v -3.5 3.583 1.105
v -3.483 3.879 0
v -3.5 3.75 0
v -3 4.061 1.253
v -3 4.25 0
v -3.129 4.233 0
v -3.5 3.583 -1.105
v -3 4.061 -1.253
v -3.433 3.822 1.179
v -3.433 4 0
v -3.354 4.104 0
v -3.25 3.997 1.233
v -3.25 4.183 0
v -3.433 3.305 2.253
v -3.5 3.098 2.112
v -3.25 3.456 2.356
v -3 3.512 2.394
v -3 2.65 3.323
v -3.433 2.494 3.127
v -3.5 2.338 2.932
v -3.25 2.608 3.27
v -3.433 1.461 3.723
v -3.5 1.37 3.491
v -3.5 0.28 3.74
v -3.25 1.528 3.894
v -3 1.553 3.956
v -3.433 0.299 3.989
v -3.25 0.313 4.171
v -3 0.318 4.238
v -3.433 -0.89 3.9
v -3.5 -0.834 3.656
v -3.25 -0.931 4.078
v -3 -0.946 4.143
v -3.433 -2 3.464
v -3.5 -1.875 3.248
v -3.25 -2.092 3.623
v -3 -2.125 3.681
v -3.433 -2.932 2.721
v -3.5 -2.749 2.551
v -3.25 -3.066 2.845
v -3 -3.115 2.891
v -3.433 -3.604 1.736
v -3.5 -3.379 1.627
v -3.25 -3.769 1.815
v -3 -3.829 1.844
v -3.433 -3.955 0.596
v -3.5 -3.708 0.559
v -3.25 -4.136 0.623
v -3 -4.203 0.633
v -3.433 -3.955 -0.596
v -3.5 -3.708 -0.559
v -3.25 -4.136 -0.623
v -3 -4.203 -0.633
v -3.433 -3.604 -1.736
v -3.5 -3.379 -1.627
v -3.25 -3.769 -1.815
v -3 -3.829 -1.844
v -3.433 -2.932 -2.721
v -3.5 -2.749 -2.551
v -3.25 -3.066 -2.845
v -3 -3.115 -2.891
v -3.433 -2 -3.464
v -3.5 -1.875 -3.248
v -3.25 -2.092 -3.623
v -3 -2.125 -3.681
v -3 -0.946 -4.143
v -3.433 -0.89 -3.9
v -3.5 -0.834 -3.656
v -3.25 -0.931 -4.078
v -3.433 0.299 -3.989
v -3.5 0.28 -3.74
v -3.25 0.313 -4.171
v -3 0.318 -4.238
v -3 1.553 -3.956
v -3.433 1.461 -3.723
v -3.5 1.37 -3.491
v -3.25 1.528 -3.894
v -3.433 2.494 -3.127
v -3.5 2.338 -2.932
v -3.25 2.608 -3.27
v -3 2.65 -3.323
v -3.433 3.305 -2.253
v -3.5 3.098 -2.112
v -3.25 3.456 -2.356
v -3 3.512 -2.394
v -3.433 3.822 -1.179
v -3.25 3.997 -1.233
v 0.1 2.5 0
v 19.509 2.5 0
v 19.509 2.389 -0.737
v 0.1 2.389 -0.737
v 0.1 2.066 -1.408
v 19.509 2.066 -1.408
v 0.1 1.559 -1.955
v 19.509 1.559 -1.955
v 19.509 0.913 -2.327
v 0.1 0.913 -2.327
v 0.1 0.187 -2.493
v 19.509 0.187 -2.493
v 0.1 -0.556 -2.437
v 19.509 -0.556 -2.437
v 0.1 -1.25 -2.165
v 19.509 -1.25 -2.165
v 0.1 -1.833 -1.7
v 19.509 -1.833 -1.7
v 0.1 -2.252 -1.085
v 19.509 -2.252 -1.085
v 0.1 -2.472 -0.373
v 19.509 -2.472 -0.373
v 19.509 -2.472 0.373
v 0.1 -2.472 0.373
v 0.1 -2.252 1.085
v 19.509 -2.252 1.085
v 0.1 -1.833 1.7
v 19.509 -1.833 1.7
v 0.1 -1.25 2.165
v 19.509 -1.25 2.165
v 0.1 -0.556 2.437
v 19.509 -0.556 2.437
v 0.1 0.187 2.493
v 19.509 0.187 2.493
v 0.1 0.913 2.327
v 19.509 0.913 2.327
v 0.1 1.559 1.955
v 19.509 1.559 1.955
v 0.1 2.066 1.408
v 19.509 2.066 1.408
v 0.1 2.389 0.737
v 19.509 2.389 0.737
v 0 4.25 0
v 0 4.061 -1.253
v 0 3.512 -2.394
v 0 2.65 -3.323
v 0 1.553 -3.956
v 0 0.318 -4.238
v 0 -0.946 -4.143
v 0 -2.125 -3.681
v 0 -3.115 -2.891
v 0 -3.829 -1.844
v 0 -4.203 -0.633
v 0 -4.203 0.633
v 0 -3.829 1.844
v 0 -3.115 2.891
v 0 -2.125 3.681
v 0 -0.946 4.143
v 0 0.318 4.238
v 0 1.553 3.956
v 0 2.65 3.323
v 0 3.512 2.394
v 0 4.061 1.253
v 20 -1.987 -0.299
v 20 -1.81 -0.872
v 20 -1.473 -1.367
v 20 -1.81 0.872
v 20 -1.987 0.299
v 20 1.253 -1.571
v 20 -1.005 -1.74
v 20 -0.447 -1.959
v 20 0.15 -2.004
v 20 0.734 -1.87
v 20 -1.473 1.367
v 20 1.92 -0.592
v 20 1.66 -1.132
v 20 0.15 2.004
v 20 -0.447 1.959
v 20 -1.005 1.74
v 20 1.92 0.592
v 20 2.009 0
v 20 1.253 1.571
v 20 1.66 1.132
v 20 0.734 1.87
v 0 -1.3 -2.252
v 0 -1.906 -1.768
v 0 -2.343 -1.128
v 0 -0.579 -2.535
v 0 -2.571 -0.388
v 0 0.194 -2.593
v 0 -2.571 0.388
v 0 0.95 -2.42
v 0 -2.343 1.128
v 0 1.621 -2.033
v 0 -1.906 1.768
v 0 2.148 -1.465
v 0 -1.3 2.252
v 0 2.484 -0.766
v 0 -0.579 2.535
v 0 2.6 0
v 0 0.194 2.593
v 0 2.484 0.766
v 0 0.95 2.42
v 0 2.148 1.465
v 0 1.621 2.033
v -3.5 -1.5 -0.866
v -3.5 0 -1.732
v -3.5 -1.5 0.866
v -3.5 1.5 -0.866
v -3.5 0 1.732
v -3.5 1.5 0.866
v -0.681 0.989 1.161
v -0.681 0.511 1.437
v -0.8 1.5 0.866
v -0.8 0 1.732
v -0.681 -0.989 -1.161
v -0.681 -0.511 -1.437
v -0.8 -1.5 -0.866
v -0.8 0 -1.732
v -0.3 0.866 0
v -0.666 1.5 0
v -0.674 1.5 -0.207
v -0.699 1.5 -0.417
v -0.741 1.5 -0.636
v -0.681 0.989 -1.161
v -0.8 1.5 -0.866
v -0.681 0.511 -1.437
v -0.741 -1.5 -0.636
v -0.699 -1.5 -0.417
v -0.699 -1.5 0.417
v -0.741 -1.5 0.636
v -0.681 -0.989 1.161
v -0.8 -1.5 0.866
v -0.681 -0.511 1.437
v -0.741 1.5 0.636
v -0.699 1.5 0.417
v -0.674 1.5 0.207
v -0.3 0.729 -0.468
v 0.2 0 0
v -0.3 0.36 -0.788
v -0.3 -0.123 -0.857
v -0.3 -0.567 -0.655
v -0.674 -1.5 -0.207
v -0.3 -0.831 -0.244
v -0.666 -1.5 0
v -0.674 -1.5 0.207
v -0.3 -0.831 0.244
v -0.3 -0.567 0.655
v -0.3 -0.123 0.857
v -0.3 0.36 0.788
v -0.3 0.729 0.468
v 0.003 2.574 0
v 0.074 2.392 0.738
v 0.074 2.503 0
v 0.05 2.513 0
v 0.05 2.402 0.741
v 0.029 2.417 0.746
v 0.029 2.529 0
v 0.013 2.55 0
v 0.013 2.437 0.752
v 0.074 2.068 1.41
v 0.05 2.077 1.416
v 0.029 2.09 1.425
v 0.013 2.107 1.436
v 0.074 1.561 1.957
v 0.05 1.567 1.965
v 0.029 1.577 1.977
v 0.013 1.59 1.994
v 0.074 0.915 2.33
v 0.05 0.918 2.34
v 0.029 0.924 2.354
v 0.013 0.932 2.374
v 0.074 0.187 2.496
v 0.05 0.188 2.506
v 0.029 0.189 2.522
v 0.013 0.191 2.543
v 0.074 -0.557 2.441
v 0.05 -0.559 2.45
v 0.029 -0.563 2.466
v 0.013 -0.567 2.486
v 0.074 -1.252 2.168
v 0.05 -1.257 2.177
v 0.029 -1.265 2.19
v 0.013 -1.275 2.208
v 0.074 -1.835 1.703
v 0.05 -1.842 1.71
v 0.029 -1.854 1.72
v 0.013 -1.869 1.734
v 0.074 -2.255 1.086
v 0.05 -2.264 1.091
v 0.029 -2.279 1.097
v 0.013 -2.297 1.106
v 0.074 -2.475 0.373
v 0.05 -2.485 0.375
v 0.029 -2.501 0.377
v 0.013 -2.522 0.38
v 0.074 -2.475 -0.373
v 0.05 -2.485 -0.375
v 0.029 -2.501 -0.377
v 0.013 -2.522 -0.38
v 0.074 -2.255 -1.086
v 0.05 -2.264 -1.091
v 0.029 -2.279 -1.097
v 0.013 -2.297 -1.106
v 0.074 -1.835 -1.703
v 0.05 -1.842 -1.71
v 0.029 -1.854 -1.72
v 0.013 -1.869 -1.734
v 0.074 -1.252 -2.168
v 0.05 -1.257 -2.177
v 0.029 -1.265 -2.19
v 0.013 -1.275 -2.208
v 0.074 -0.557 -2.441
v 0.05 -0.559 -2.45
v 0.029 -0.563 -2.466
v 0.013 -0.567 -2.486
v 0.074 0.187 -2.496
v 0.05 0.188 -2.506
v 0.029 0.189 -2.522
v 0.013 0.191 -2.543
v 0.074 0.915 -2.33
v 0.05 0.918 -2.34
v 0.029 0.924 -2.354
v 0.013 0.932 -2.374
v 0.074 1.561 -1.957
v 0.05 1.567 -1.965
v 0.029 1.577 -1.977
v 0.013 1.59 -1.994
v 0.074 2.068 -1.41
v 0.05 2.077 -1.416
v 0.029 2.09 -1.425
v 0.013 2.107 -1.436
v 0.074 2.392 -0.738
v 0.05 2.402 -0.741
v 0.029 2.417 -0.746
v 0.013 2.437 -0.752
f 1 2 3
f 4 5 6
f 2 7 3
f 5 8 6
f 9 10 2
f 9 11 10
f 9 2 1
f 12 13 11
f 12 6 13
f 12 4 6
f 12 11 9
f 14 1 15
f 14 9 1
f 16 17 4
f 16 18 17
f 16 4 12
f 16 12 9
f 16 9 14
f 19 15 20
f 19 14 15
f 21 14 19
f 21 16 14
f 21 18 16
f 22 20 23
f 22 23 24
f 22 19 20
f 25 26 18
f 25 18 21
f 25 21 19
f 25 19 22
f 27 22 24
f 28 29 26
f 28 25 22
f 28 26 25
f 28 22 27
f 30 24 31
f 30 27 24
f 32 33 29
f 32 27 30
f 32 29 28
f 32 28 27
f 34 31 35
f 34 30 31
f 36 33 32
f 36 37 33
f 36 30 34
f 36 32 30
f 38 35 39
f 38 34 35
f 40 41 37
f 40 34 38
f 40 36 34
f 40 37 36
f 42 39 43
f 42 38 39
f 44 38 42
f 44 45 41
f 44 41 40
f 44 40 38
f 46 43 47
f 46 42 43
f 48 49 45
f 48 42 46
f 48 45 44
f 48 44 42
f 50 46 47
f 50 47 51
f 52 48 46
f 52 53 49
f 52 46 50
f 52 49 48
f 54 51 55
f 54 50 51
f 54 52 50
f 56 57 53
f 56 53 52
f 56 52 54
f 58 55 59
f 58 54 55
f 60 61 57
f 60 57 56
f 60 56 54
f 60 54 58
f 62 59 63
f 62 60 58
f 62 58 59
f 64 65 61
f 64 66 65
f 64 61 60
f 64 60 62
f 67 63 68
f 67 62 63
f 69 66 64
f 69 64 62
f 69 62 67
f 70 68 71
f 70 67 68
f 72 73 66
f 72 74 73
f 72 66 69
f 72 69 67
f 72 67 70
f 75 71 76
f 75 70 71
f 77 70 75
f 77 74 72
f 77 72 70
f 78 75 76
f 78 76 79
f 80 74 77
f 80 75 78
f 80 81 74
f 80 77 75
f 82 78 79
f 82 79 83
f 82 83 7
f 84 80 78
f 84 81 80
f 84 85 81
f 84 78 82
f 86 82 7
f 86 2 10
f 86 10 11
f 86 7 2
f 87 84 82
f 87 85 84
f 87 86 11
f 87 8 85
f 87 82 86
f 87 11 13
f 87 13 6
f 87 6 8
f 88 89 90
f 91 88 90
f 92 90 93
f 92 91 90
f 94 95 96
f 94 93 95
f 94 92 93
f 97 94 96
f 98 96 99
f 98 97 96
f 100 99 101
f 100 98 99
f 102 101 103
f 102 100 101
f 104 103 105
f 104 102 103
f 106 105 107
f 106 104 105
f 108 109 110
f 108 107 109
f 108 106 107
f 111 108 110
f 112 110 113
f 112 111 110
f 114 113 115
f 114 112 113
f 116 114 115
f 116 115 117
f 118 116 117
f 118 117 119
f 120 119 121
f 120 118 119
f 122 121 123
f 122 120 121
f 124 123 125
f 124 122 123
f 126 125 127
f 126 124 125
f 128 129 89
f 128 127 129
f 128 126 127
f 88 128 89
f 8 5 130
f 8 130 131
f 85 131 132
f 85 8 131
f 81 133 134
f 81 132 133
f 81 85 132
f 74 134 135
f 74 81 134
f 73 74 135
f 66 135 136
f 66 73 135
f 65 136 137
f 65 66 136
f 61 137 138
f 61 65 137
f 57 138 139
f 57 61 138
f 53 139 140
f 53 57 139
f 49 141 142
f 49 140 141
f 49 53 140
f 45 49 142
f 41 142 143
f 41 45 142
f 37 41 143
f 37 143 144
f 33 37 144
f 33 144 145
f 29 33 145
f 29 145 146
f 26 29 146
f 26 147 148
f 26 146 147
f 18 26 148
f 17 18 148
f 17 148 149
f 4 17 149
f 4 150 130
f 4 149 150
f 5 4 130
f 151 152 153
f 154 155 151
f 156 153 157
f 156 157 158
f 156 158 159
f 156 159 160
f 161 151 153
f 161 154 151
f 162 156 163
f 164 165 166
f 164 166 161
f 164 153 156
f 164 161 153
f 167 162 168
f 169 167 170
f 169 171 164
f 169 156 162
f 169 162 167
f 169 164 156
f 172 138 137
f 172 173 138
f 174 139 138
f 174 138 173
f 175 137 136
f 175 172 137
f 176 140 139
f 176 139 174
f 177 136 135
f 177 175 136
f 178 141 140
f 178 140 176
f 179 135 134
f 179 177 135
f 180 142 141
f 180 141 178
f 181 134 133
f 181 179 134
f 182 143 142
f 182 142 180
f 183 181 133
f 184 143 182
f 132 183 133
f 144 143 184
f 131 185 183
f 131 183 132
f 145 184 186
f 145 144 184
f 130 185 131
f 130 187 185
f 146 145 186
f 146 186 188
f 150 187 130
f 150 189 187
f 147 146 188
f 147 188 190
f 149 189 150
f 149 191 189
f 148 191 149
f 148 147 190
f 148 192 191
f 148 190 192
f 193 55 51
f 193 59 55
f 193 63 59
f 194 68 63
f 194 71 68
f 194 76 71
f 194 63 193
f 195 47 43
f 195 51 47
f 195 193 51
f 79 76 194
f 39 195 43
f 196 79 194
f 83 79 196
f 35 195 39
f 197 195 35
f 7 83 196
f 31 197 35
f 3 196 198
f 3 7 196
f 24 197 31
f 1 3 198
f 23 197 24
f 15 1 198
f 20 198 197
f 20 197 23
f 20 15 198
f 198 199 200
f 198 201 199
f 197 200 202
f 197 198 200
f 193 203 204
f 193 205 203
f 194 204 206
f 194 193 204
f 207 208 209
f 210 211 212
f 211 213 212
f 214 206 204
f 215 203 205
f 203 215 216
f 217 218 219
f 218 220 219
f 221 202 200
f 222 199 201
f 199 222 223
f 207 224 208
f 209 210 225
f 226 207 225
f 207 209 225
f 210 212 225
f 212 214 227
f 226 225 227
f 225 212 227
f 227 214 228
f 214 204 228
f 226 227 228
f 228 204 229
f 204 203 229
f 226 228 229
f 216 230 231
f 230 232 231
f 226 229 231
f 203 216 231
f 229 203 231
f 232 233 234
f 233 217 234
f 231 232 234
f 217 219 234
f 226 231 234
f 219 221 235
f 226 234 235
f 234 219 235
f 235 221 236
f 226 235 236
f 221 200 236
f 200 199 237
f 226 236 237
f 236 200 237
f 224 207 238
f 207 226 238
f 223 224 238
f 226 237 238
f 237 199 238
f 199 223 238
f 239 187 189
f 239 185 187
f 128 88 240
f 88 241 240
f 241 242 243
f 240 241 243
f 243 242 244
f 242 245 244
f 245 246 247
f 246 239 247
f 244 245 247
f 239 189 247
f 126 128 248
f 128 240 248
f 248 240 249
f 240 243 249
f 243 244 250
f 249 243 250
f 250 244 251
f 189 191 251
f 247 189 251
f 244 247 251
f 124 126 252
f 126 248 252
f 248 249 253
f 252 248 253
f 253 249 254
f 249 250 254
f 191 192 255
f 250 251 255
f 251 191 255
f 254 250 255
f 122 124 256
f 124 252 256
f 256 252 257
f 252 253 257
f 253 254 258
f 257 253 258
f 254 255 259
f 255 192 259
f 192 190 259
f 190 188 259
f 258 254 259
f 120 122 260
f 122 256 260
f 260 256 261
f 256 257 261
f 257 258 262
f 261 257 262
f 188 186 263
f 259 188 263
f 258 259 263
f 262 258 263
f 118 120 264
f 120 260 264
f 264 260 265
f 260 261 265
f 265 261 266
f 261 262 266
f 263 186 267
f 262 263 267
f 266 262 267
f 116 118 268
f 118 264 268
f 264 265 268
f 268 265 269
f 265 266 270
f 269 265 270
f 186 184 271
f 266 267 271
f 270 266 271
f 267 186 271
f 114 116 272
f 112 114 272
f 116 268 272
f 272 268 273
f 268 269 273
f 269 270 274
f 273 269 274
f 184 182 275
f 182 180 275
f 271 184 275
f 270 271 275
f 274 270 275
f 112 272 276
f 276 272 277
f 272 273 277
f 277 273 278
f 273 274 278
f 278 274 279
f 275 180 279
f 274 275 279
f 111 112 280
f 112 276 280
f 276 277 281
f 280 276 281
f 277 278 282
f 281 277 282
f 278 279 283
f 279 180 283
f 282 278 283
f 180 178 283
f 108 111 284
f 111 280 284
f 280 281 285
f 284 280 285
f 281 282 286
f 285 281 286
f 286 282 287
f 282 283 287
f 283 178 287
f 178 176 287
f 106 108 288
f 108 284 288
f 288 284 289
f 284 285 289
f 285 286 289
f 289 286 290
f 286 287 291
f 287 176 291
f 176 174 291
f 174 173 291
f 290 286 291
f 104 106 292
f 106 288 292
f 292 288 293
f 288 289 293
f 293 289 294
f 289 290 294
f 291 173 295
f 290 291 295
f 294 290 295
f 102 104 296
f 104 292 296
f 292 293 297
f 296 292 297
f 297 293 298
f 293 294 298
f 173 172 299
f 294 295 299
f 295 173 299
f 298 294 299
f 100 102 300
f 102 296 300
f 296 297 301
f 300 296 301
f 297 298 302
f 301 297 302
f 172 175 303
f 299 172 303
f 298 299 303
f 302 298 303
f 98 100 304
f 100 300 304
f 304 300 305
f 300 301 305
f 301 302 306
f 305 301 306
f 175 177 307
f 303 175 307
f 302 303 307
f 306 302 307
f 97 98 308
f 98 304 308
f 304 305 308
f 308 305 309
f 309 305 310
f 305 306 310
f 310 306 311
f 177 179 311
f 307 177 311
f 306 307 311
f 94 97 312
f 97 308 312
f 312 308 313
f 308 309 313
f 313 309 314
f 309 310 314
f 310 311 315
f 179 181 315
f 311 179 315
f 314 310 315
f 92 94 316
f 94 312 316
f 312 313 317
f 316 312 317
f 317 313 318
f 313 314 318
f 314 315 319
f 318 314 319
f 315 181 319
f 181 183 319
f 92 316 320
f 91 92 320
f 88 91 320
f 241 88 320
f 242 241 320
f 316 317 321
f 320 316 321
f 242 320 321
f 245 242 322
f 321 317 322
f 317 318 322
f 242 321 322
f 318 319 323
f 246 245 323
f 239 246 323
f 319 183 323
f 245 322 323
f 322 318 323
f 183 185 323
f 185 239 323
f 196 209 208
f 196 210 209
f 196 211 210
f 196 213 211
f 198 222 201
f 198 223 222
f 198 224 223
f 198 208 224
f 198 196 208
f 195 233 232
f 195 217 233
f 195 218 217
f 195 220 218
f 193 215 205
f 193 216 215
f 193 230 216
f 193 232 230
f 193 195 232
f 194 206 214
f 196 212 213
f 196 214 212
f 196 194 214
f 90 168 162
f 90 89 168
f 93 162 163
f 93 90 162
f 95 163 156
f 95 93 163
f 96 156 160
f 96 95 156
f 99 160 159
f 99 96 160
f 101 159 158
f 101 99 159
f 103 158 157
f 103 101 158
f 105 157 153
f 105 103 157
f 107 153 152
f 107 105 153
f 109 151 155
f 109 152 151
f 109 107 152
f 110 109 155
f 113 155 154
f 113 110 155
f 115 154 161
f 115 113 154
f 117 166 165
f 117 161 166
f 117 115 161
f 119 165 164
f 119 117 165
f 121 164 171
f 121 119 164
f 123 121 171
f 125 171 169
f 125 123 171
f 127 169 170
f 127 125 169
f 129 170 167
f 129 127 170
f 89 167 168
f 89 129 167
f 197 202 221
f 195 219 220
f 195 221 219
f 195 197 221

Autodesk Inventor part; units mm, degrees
ref_plane "YZ Plane" through (0, 0, 0) normal (1, 0, 0) x (0, 1, 0)
ref_plane "XZ Plane" through (0, 0, 0) normal (0, 1, 0) x (-1, 0, 0)
sketch "Sketch1" plane through (0, 0, 0) normal (0, 0, 1) x (1, 0, 0)
  line L0 (0.2, 0) -> (20, 0)
  line L1 (20, 0) -> (20, 2.5)
  line L2 (20, 2.5) -> (2.4, 2.5)
  line L3 (2.4, 2.5) -> (1.9091, 2.5)
  line L4 (1.9091, 2.5) -> (0, 2.5)
  line L5 (0, 2.5) -> (0, 4.25)
  line L6 (0, 4.25) -> (-3.5, 4.25)
  line L7 (-3.5, 4.25) -> (-3.5, 1.7321)
  line L8 (-3.5, 1.7321) -> (-0.8, 1.7321)
  line L9 (-0.8, 1.7321) -> (0.2, 0)
  line L10 (-8.2, 0) -> (24.7, 0) projected
  line L11 (0, -0.85) -> (0, 5.1) projected
  line L12 (2.4, 2.5) -> (0, 2.5) construction
  dimension "d1" = 17.6
  dimension "d2" = 0.4909
  dimension "d3" = 3.5
  dimension "d4" = 2.7
  dimension "d5" = 60
  dimension "d6" = 5
  dimension "d7" = 5
  dimension "d8" = 3.4641
  dimension "d9" = 8.5
  dimension "d26" = 20
revolve "Body" add sketch "Sketch1" angle 360 about axis through (0.2, 0, 0) along (1, 0, 0) contours L9 L11 L4 L3 L2 L1 L0 | L9 L8 L7 L6 L5 L11
sketch "Sketch2" plane through (-3.5, 0, 0) normal (-1, 0, 0) x (0, 0, 1)
  circle A0 centre (0, 0) radius 1.7321 projected
  line L0 (0, -5.95) -> (0, 5.95) projected
  line L1 (-5.95, 0) -> (5.95, 0) projected
  line L2 (1.7321, 0) -> (0.866, -1.5)
  line L3 (0.866, -1.5) -> (-0.866, -1.5)
  line L4 (-0.866, -1.5) -> (-1.7321, 0)
  line L5 (-1.7321, 0) -> (-0.866, 1.5)
  line L6 (-0.866, 1.5) -> (0.866, 1.5)
  line L7 (0.866, 1.5) -> (1.7321, 0)
extrude "Slot" add sketch "Sketch2" against normal up to next contours L7 A0 | A0 L2 | L6 L0 A0 | A0 L0 L3 | L0 L6 A0 | A0 L3 L0 | L4 A0 | A0 L5
fillet "Fillet1" radius 0.5 1 edges at (-3.5, -4.25, 0)
thread "Thread" size "M5x0.8" class "6g" standard "ISO Metric profile" length 17.6
chamfer "Chamfer1" distance 0.4908 distance2 0.4908 1 edges at (20, -2.5, 0) measured on face at (20, -0.7379, -0.3873)
ref_plane "Work Plane1" through (29, 0, 0) normal (0, -1, 0) x (1, 0, 0)
fillet "Fillet2" radius 0.1 1 edges at (0, -2.5, 0)
equation "\"d1\" = GEL"
equation "\"d3\" = KOH"
equation "\"d4\" = INTI"
equation "\"d6\" = GD"
equation "\"d7\" = BDM"
equation "\"d8\" = 1.1547 * SW"
equation "\"d9\" = KOD"
equation "\"d26\" = NLG"
equation "\"d30\" = R"
equation "\"d17\" = RR"
equation "\"d13\" = GEL"
equation "\"d15\" = -0.5 * SPD + 0.5 * GD"
equation "\"d16\" = GUL"
equation "\"GD\" = NND"
equation "\"NLG\" = 20"
equation "\"GEL\" = 17.6"
equation "\"KOD\" = 8.5"
equation "\"KOH\" = 3.5"
equation "\"INTI\" = 2.7"
equation "\"GAL\" = 0.61345 * PTC"
equation "\"GUL\" = 0.61345 * PTC"
equation "\"BDM\" = NND"
equation "\"SW\" = 3"
equation "\"RR\" = 0.5"
equation "\"SPD\" = NND - 1.2269 * PTC"
equation "\"R\" = 0.1"
equation "\"TOA\" = 30deg"
equation "\"GD1\" = THREADDIA - 1.2269 * PTC"
equation "\"THREADDIA\" = 5"
equation "\"FAWI\" = 45deg"
equation "\"ANG\" = 120deg"
equation "\"PTC\" = 0.8"
equation "\"NND\" = 5"
equation "\"E0\" = 1.155 * SW"
properties part number "DIN 7984 - M5 x 20" material "Steel, Mild"
